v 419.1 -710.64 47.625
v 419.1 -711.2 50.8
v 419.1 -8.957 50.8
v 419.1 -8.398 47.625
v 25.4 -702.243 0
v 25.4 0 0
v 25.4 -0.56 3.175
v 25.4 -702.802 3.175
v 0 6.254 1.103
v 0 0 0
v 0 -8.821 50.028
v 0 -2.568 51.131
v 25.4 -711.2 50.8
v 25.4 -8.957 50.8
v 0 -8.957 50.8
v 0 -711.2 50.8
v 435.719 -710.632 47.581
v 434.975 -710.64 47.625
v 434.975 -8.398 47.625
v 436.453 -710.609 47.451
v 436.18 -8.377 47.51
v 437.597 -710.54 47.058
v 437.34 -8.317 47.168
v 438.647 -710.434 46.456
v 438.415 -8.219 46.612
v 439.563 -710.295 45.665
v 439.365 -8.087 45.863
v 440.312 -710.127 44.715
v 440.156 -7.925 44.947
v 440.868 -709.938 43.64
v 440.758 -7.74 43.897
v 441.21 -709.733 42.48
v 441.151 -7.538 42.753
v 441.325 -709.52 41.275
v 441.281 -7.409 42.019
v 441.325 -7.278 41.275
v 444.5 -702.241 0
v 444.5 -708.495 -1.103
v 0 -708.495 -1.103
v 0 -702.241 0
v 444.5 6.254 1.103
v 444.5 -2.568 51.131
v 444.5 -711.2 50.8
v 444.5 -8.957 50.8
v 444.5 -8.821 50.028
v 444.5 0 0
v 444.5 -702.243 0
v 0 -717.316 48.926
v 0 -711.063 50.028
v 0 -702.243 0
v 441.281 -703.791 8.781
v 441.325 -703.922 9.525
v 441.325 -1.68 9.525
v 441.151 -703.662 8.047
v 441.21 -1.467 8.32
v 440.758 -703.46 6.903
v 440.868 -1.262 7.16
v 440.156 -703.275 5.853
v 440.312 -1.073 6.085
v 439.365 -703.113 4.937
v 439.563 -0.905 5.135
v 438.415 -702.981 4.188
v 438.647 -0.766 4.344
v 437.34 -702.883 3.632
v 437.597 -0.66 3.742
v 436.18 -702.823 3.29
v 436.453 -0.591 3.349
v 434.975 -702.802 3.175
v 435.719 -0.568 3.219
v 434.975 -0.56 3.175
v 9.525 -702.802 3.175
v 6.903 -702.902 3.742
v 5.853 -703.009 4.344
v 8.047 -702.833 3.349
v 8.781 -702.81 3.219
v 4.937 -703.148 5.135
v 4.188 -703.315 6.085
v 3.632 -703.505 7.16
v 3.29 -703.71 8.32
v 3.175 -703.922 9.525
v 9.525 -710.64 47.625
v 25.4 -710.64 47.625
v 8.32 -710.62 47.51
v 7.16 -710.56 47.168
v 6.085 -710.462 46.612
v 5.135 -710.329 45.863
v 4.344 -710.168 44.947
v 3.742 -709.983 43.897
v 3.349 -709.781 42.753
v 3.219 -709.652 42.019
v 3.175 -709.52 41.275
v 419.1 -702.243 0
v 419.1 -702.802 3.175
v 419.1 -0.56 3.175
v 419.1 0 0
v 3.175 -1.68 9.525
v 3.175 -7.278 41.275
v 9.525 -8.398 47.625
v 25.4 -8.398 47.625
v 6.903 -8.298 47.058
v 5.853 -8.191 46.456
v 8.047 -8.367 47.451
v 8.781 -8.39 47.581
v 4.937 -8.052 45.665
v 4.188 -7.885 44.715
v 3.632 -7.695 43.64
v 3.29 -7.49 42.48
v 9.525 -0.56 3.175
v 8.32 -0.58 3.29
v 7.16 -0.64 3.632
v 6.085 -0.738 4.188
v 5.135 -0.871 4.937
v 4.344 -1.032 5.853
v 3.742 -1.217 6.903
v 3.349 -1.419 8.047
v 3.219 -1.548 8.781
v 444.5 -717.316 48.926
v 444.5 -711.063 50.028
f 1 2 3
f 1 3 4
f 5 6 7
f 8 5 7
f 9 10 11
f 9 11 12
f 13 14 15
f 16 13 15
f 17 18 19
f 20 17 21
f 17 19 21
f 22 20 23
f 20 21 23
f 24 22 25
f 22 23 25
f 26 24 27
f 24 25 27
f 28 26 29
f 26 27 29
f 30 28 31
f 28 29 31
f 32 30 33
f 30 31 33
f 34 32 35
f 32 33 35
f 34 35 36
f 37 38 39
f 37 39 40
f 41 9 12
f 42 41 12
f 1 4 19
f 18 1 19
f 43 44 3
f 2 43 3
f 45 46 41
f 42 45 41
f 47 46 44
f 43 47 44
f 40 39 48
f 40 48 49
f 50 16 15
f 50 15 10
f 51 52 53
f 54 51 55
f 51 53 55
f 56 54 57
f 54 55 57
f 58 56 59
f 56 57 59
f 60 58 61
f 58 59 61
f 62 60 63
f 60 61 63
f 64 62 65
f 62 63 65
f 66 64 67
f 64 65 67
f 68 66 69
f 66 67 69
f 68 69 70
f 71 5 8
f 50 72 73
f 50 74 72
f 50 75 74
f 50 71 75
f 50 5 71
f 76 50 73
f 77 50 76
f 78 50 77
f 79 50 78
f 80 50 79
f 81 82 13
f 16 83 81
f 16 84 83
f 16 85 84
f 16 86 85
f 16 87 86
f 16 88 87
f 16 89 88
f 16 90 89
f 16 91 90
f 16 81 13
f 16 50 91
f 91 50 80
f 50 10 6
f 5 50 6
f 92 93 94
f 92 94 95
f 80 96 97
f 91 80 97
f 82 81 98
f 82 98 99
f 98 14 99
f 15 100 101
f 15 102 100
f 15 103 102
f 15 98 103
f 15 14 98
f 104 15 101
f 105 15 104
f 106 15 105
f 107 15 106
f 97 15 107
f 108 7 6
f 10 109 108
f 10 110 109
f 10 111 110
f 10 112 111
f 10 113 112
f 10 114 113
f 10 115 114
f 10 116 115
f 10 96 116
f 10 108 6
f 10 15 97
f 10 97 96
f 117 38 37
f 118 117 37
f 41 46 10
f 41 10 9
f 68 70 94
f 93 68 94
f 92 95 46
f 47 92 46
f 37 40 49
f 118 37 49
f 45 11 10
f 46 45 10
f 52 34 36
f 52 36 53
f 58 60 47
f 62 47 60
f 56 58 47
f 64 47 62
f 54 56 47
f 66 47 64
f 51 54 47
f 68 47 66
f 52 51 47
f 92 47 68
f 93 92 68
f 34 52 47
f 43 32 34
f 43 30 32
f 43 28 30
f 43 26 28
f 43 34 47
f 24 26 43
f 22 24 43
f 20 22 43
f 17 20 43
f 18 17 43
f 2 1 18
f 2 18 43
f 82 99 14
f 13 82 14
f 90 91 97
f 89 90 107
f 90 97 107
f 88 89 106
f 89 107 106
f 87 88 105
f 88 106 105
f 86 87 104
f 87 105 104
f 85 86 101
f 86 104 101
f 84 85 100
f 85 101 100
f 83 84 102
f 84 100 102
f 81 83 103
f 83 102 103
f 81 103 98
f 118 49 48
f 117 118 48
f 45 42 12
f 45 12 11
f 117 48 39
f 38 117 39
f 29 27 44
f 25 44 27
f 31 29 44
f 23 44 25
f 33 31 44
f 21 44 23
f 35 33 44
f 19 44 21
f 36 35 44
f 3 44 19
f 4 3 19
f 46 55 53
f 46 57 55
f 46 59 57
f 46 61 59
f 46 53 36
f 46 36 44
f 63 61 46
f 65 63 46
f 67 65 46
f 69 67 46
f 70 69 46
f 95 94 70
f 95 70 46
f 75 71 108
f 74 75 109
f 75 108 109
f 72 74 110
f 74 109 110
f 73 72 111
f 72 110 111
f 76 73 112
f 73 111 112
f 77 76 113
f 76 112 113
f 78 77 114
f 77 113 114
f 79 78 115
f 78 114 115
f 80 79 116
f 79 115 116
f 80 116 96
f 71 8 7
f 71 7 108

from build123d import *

# Parameters (mm, degrees)
F1_DEPTH = 711.2
F3_DEPTH = 444.501
F5_DEPTH = 444.5


with BuildPart() as f1:
    # F0 (on Front) → F1 (new body)
    with BuildSketch(Plane.XZ):
        with BuildLine():
            Line((0, 50.8), (0, 0))
            Line((0, 0), (25.4, 0))
            Line((25.4, 0), (25.4, 3.175))
            Line((25.4, 3.175), (9.525, 3.175))
            ThreePointArc((9.525, 3.175), (5.034872, 5.034872), (3.175, 9.525))
            Line((3.175, 9.525), (3.175, 41.275))
            ThreePointArc((3.175, 41.275), (5.034872, 45.765128), (9.525, 47.625))
            Line((9.525, 47.625), (25.4, 47.625))
            Line((25.4, 47.625), (25.4, 50.8))
            Line((25.4, 50.8), (0, 50.8))
        make_face()
        with BuildLine():
            Line((419.1, 3.175), (419.1, 0))
            Line((419.1, 0), (444.5, 0))
            Line((444.5, 0), (444.5, 50.8))
            Line((444.5, 50.8), (419.1, 50.8))
            Line((419.1, 50.8), (419.1, 47.625))
            Line((419.1, 47.625), (434.975, 47.625))
            ThreePointArc((434.975, 47.625), (439.465128, 45.765128), (441.325, 41.275))
            Line((441.325, 41.275), (441.325, 9.525))
            ThreePointArc((441.325, 9.525), (439.465128, 5.034872), (434.975, 3.175))
            Line((434.975, 3.175), (419.1, 3.175))
        make_face()
    extrude(amount=F1_DEPTH)

    # F2 (on Right) → F3 (cut, through all)
    with BuildSketch(Plane.YZ):
        Polygon((-8.957411, 50.8), (0, 0), (0, 50.8), align=None)
        Polygon((-711.2, 0), (-702.242589, 0), (-711.2, 50.8), align=None)
    extrude(amount=F3_DEPTH, mode=Mode.SUBTRACT)


with BuildPart() as f5:
    # F4 (on Right) → F5 (new body)
    with BuildSketch(Plane.YZ):
        Polygon((-708.494949, -1.102666), (-702.24142, 0), (-711.062747, 50.028234), (-717.316277, 48.925568), align=None)
        Polygon((-8.821327, 50.028234), (0, 0), (6.253529, 1.102666), (-2.567798, 51.1309), align=None)
    extrude(amount=F5_DEPTH)


solid = Compound([f1.part, f5.part])
